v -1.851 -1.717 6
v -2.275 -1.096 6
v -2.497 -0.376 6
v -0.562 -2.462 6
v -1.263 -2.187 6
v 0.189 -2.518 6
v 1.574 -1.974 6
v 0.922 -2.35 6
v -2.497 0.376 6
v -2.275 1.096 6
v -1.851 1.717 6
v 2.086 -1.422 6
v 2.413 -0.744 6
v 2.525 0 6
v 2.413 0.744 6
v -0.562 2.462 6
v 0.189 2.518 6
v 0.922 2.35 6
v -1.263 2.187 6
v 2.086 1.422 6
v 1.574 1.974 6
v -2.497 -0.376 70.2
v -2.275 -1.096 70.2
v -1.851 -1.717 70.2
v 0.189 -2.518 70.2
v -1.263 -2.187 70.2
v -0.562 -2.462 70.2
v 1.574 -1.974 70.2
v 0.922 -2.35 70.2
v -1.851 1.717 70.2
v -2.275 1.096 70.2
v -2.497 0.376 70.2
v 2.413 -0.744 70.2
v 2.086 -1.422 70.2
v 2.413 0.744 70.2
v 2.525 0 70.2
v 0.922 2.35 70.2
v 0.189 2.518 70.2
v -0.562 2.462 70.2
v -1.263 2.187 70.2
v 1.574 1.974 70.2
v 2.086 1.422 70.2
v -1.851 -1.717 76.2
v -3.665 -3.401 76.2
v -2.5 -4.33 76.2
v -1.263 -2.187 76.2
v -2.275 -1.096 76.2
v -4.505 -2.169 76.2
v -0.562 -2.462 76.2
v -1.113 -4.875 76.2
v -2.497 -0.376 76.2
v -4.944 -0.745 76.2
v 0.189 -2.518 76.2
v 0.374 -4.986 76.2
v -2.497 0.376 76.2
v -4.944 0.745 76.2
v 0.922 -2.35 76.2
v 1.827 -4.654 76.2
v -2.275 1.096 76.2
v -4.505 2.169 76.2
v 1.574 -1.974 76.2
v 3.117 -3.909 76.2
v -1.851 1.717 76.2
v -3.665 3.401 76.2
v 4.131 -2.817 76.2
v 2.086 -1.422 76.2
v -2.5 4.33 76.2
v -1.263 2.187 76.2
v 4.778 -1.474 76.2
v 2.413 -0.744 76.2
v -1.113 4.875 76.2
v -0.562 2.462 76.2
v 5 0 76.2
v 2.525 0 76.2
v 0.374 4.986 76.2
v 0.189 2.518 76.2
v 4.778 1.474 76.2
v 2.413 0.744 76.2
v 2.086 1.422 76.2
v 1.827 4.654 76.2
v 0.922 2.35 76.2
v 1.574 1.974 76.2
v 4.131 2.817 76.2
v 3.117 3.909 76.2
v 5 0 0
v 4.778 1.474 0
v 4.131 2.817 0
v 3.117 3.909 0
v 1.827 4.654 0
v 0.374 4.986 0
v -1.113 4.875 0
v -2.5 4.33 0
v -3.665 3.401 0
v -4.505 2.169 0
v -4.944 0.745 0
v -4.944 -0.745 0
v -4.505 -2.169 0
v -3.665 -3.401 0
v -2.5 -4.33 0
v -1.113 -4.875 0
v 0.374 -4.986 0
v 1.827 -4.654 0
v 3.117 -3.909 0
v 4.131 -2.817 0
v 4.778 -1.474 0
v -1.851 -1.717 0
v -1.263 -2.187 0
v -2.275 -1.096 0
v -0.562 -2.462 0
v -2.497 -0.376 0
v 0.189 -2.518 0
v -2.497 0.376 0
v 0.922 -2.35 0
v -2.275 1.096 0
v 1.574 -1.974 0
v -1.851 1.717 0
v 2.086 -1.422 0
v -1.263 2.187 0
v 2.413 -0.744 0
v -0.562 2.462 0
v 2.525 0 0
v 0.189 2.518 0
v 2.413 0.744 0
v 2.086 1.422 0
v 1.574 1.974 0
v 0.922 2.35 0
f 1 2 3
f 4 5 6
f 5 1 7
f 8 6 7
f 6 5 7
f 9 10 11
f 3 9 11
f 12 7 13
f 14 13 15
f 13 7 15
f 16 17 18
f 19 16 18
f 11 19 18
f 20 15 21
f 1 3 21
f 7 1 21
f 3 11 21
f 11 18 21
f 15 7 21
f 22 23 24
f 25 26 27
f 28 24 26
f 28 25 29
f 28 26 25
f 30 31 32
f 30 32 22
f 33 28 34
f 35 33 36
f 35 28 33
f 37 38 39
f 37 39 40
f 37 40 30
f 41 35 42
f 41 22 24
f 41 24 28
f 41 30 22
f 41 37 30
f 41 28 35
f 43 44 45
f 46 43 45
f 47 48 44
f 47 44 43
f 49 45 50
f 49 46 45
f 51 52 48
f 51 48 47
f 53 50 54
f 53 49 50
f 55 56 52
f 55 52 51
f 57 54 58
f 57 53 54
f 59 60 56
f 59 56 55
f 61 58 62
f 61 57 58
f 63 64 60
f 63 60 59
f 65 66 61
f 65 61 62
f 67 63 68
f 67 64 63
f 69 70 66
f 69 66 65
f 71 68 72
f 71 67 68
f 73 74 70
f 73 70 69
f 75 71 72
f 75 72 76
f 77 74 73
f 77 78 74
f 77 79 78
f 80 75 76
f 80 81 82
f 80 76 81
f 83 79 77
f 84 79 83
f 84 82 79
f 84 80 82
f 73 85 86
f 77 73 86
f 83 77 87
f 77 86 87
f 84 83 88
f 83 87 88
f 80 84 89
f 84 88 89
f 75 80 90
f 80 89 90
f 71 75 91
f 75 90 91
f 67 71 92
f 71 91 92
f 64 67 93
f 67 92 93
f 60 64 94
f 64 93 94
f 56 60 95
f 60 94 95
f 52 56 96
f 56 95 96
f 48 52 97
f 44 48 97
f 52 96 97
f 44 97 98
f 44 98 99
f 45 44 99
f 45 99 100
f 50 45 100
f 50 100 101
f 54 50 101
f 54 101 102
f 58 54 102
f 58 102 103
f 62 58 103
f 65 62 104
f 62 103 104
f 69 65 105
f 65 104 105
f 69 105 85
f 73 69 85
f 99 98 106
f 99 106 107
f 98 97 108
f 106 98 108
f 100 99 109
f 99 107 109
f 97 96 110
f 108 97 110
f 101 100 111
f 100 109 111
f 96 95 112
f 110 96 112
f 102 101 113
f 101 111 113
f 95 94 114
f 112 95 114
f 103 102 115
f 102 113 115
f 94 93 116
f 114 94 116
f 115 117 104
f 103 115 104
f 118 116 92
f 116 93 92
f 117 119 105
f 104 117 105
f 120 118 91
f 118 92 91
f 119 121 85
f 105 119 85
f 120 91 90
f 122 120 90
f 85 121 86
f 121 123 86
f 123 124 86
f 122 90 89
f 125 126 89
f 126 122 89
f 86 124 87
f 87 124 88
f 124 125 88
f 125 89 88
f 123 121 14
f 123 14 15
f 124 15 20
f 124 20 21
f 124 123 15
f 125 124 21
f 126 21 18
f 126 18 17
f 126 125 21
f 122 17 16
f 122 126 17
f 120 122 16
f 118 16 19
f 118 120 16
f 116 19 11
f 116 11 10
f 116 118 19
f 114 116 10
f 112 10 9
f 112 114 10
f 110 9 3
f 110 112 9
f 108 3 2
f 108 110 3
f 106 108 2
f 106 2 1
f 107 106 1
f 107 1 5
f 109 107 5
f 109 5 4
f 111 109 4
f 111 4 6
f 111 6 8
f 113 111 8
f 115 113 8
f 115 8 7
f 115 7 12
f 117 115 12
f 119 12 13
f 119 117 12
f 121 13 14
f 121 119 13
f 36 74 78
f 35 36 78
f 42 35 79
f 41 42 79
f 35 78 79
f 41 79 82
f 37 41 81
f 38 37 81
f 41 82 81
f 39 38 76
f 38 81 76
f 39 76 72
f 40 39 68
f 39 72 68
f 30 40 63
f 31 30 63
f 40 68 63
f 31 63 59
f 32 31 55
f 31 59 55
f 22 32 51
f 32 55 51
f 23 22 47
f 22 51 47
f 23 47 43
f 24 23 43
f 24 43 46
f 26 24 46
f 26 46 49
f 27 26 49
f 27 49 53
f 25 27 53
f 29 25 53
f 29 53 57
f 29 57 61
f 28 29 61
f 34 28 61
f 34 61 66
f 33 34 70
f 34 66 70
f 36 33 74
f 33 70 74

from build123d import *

# Parameters (mm, degrees)
SKETCH1_R           = 5
BOSS_EXTRUDE1_DEPTH = 76.2
SKETCH2_R           = 2.525
CUT_EXTRUDE1_DEPTH  = 6


with BuildPart() as part:
    # Sketch1 → Boss-Extrude1 (new body)
    with BuildSketch(Plane.XY):
        Circle(SKETCH1_R)
    extrude(amount=BOSS_EXTRUDE1_DEPTH)

    # Sketch2 → Cut-Extrude1 (cut)
    with BuildSketch(Plane.XY.offset(76.2)):
        Circle(SKETCH2_R)
    cut_extrude1 = extrude(amount=-CUT_EXTRUDE1_DEPTH, mode=Mode.SUBTRACT)

    # Mirror1: Cut-Extrude1 across plane
    add(cut_extrude1.mirror(Plane(origin=(0, 0, 38.1), x_dir=(1, 0, 0), z_dir=(0, 0, -1))), mode=Mode.SUBTRACT)


solid = part.part
